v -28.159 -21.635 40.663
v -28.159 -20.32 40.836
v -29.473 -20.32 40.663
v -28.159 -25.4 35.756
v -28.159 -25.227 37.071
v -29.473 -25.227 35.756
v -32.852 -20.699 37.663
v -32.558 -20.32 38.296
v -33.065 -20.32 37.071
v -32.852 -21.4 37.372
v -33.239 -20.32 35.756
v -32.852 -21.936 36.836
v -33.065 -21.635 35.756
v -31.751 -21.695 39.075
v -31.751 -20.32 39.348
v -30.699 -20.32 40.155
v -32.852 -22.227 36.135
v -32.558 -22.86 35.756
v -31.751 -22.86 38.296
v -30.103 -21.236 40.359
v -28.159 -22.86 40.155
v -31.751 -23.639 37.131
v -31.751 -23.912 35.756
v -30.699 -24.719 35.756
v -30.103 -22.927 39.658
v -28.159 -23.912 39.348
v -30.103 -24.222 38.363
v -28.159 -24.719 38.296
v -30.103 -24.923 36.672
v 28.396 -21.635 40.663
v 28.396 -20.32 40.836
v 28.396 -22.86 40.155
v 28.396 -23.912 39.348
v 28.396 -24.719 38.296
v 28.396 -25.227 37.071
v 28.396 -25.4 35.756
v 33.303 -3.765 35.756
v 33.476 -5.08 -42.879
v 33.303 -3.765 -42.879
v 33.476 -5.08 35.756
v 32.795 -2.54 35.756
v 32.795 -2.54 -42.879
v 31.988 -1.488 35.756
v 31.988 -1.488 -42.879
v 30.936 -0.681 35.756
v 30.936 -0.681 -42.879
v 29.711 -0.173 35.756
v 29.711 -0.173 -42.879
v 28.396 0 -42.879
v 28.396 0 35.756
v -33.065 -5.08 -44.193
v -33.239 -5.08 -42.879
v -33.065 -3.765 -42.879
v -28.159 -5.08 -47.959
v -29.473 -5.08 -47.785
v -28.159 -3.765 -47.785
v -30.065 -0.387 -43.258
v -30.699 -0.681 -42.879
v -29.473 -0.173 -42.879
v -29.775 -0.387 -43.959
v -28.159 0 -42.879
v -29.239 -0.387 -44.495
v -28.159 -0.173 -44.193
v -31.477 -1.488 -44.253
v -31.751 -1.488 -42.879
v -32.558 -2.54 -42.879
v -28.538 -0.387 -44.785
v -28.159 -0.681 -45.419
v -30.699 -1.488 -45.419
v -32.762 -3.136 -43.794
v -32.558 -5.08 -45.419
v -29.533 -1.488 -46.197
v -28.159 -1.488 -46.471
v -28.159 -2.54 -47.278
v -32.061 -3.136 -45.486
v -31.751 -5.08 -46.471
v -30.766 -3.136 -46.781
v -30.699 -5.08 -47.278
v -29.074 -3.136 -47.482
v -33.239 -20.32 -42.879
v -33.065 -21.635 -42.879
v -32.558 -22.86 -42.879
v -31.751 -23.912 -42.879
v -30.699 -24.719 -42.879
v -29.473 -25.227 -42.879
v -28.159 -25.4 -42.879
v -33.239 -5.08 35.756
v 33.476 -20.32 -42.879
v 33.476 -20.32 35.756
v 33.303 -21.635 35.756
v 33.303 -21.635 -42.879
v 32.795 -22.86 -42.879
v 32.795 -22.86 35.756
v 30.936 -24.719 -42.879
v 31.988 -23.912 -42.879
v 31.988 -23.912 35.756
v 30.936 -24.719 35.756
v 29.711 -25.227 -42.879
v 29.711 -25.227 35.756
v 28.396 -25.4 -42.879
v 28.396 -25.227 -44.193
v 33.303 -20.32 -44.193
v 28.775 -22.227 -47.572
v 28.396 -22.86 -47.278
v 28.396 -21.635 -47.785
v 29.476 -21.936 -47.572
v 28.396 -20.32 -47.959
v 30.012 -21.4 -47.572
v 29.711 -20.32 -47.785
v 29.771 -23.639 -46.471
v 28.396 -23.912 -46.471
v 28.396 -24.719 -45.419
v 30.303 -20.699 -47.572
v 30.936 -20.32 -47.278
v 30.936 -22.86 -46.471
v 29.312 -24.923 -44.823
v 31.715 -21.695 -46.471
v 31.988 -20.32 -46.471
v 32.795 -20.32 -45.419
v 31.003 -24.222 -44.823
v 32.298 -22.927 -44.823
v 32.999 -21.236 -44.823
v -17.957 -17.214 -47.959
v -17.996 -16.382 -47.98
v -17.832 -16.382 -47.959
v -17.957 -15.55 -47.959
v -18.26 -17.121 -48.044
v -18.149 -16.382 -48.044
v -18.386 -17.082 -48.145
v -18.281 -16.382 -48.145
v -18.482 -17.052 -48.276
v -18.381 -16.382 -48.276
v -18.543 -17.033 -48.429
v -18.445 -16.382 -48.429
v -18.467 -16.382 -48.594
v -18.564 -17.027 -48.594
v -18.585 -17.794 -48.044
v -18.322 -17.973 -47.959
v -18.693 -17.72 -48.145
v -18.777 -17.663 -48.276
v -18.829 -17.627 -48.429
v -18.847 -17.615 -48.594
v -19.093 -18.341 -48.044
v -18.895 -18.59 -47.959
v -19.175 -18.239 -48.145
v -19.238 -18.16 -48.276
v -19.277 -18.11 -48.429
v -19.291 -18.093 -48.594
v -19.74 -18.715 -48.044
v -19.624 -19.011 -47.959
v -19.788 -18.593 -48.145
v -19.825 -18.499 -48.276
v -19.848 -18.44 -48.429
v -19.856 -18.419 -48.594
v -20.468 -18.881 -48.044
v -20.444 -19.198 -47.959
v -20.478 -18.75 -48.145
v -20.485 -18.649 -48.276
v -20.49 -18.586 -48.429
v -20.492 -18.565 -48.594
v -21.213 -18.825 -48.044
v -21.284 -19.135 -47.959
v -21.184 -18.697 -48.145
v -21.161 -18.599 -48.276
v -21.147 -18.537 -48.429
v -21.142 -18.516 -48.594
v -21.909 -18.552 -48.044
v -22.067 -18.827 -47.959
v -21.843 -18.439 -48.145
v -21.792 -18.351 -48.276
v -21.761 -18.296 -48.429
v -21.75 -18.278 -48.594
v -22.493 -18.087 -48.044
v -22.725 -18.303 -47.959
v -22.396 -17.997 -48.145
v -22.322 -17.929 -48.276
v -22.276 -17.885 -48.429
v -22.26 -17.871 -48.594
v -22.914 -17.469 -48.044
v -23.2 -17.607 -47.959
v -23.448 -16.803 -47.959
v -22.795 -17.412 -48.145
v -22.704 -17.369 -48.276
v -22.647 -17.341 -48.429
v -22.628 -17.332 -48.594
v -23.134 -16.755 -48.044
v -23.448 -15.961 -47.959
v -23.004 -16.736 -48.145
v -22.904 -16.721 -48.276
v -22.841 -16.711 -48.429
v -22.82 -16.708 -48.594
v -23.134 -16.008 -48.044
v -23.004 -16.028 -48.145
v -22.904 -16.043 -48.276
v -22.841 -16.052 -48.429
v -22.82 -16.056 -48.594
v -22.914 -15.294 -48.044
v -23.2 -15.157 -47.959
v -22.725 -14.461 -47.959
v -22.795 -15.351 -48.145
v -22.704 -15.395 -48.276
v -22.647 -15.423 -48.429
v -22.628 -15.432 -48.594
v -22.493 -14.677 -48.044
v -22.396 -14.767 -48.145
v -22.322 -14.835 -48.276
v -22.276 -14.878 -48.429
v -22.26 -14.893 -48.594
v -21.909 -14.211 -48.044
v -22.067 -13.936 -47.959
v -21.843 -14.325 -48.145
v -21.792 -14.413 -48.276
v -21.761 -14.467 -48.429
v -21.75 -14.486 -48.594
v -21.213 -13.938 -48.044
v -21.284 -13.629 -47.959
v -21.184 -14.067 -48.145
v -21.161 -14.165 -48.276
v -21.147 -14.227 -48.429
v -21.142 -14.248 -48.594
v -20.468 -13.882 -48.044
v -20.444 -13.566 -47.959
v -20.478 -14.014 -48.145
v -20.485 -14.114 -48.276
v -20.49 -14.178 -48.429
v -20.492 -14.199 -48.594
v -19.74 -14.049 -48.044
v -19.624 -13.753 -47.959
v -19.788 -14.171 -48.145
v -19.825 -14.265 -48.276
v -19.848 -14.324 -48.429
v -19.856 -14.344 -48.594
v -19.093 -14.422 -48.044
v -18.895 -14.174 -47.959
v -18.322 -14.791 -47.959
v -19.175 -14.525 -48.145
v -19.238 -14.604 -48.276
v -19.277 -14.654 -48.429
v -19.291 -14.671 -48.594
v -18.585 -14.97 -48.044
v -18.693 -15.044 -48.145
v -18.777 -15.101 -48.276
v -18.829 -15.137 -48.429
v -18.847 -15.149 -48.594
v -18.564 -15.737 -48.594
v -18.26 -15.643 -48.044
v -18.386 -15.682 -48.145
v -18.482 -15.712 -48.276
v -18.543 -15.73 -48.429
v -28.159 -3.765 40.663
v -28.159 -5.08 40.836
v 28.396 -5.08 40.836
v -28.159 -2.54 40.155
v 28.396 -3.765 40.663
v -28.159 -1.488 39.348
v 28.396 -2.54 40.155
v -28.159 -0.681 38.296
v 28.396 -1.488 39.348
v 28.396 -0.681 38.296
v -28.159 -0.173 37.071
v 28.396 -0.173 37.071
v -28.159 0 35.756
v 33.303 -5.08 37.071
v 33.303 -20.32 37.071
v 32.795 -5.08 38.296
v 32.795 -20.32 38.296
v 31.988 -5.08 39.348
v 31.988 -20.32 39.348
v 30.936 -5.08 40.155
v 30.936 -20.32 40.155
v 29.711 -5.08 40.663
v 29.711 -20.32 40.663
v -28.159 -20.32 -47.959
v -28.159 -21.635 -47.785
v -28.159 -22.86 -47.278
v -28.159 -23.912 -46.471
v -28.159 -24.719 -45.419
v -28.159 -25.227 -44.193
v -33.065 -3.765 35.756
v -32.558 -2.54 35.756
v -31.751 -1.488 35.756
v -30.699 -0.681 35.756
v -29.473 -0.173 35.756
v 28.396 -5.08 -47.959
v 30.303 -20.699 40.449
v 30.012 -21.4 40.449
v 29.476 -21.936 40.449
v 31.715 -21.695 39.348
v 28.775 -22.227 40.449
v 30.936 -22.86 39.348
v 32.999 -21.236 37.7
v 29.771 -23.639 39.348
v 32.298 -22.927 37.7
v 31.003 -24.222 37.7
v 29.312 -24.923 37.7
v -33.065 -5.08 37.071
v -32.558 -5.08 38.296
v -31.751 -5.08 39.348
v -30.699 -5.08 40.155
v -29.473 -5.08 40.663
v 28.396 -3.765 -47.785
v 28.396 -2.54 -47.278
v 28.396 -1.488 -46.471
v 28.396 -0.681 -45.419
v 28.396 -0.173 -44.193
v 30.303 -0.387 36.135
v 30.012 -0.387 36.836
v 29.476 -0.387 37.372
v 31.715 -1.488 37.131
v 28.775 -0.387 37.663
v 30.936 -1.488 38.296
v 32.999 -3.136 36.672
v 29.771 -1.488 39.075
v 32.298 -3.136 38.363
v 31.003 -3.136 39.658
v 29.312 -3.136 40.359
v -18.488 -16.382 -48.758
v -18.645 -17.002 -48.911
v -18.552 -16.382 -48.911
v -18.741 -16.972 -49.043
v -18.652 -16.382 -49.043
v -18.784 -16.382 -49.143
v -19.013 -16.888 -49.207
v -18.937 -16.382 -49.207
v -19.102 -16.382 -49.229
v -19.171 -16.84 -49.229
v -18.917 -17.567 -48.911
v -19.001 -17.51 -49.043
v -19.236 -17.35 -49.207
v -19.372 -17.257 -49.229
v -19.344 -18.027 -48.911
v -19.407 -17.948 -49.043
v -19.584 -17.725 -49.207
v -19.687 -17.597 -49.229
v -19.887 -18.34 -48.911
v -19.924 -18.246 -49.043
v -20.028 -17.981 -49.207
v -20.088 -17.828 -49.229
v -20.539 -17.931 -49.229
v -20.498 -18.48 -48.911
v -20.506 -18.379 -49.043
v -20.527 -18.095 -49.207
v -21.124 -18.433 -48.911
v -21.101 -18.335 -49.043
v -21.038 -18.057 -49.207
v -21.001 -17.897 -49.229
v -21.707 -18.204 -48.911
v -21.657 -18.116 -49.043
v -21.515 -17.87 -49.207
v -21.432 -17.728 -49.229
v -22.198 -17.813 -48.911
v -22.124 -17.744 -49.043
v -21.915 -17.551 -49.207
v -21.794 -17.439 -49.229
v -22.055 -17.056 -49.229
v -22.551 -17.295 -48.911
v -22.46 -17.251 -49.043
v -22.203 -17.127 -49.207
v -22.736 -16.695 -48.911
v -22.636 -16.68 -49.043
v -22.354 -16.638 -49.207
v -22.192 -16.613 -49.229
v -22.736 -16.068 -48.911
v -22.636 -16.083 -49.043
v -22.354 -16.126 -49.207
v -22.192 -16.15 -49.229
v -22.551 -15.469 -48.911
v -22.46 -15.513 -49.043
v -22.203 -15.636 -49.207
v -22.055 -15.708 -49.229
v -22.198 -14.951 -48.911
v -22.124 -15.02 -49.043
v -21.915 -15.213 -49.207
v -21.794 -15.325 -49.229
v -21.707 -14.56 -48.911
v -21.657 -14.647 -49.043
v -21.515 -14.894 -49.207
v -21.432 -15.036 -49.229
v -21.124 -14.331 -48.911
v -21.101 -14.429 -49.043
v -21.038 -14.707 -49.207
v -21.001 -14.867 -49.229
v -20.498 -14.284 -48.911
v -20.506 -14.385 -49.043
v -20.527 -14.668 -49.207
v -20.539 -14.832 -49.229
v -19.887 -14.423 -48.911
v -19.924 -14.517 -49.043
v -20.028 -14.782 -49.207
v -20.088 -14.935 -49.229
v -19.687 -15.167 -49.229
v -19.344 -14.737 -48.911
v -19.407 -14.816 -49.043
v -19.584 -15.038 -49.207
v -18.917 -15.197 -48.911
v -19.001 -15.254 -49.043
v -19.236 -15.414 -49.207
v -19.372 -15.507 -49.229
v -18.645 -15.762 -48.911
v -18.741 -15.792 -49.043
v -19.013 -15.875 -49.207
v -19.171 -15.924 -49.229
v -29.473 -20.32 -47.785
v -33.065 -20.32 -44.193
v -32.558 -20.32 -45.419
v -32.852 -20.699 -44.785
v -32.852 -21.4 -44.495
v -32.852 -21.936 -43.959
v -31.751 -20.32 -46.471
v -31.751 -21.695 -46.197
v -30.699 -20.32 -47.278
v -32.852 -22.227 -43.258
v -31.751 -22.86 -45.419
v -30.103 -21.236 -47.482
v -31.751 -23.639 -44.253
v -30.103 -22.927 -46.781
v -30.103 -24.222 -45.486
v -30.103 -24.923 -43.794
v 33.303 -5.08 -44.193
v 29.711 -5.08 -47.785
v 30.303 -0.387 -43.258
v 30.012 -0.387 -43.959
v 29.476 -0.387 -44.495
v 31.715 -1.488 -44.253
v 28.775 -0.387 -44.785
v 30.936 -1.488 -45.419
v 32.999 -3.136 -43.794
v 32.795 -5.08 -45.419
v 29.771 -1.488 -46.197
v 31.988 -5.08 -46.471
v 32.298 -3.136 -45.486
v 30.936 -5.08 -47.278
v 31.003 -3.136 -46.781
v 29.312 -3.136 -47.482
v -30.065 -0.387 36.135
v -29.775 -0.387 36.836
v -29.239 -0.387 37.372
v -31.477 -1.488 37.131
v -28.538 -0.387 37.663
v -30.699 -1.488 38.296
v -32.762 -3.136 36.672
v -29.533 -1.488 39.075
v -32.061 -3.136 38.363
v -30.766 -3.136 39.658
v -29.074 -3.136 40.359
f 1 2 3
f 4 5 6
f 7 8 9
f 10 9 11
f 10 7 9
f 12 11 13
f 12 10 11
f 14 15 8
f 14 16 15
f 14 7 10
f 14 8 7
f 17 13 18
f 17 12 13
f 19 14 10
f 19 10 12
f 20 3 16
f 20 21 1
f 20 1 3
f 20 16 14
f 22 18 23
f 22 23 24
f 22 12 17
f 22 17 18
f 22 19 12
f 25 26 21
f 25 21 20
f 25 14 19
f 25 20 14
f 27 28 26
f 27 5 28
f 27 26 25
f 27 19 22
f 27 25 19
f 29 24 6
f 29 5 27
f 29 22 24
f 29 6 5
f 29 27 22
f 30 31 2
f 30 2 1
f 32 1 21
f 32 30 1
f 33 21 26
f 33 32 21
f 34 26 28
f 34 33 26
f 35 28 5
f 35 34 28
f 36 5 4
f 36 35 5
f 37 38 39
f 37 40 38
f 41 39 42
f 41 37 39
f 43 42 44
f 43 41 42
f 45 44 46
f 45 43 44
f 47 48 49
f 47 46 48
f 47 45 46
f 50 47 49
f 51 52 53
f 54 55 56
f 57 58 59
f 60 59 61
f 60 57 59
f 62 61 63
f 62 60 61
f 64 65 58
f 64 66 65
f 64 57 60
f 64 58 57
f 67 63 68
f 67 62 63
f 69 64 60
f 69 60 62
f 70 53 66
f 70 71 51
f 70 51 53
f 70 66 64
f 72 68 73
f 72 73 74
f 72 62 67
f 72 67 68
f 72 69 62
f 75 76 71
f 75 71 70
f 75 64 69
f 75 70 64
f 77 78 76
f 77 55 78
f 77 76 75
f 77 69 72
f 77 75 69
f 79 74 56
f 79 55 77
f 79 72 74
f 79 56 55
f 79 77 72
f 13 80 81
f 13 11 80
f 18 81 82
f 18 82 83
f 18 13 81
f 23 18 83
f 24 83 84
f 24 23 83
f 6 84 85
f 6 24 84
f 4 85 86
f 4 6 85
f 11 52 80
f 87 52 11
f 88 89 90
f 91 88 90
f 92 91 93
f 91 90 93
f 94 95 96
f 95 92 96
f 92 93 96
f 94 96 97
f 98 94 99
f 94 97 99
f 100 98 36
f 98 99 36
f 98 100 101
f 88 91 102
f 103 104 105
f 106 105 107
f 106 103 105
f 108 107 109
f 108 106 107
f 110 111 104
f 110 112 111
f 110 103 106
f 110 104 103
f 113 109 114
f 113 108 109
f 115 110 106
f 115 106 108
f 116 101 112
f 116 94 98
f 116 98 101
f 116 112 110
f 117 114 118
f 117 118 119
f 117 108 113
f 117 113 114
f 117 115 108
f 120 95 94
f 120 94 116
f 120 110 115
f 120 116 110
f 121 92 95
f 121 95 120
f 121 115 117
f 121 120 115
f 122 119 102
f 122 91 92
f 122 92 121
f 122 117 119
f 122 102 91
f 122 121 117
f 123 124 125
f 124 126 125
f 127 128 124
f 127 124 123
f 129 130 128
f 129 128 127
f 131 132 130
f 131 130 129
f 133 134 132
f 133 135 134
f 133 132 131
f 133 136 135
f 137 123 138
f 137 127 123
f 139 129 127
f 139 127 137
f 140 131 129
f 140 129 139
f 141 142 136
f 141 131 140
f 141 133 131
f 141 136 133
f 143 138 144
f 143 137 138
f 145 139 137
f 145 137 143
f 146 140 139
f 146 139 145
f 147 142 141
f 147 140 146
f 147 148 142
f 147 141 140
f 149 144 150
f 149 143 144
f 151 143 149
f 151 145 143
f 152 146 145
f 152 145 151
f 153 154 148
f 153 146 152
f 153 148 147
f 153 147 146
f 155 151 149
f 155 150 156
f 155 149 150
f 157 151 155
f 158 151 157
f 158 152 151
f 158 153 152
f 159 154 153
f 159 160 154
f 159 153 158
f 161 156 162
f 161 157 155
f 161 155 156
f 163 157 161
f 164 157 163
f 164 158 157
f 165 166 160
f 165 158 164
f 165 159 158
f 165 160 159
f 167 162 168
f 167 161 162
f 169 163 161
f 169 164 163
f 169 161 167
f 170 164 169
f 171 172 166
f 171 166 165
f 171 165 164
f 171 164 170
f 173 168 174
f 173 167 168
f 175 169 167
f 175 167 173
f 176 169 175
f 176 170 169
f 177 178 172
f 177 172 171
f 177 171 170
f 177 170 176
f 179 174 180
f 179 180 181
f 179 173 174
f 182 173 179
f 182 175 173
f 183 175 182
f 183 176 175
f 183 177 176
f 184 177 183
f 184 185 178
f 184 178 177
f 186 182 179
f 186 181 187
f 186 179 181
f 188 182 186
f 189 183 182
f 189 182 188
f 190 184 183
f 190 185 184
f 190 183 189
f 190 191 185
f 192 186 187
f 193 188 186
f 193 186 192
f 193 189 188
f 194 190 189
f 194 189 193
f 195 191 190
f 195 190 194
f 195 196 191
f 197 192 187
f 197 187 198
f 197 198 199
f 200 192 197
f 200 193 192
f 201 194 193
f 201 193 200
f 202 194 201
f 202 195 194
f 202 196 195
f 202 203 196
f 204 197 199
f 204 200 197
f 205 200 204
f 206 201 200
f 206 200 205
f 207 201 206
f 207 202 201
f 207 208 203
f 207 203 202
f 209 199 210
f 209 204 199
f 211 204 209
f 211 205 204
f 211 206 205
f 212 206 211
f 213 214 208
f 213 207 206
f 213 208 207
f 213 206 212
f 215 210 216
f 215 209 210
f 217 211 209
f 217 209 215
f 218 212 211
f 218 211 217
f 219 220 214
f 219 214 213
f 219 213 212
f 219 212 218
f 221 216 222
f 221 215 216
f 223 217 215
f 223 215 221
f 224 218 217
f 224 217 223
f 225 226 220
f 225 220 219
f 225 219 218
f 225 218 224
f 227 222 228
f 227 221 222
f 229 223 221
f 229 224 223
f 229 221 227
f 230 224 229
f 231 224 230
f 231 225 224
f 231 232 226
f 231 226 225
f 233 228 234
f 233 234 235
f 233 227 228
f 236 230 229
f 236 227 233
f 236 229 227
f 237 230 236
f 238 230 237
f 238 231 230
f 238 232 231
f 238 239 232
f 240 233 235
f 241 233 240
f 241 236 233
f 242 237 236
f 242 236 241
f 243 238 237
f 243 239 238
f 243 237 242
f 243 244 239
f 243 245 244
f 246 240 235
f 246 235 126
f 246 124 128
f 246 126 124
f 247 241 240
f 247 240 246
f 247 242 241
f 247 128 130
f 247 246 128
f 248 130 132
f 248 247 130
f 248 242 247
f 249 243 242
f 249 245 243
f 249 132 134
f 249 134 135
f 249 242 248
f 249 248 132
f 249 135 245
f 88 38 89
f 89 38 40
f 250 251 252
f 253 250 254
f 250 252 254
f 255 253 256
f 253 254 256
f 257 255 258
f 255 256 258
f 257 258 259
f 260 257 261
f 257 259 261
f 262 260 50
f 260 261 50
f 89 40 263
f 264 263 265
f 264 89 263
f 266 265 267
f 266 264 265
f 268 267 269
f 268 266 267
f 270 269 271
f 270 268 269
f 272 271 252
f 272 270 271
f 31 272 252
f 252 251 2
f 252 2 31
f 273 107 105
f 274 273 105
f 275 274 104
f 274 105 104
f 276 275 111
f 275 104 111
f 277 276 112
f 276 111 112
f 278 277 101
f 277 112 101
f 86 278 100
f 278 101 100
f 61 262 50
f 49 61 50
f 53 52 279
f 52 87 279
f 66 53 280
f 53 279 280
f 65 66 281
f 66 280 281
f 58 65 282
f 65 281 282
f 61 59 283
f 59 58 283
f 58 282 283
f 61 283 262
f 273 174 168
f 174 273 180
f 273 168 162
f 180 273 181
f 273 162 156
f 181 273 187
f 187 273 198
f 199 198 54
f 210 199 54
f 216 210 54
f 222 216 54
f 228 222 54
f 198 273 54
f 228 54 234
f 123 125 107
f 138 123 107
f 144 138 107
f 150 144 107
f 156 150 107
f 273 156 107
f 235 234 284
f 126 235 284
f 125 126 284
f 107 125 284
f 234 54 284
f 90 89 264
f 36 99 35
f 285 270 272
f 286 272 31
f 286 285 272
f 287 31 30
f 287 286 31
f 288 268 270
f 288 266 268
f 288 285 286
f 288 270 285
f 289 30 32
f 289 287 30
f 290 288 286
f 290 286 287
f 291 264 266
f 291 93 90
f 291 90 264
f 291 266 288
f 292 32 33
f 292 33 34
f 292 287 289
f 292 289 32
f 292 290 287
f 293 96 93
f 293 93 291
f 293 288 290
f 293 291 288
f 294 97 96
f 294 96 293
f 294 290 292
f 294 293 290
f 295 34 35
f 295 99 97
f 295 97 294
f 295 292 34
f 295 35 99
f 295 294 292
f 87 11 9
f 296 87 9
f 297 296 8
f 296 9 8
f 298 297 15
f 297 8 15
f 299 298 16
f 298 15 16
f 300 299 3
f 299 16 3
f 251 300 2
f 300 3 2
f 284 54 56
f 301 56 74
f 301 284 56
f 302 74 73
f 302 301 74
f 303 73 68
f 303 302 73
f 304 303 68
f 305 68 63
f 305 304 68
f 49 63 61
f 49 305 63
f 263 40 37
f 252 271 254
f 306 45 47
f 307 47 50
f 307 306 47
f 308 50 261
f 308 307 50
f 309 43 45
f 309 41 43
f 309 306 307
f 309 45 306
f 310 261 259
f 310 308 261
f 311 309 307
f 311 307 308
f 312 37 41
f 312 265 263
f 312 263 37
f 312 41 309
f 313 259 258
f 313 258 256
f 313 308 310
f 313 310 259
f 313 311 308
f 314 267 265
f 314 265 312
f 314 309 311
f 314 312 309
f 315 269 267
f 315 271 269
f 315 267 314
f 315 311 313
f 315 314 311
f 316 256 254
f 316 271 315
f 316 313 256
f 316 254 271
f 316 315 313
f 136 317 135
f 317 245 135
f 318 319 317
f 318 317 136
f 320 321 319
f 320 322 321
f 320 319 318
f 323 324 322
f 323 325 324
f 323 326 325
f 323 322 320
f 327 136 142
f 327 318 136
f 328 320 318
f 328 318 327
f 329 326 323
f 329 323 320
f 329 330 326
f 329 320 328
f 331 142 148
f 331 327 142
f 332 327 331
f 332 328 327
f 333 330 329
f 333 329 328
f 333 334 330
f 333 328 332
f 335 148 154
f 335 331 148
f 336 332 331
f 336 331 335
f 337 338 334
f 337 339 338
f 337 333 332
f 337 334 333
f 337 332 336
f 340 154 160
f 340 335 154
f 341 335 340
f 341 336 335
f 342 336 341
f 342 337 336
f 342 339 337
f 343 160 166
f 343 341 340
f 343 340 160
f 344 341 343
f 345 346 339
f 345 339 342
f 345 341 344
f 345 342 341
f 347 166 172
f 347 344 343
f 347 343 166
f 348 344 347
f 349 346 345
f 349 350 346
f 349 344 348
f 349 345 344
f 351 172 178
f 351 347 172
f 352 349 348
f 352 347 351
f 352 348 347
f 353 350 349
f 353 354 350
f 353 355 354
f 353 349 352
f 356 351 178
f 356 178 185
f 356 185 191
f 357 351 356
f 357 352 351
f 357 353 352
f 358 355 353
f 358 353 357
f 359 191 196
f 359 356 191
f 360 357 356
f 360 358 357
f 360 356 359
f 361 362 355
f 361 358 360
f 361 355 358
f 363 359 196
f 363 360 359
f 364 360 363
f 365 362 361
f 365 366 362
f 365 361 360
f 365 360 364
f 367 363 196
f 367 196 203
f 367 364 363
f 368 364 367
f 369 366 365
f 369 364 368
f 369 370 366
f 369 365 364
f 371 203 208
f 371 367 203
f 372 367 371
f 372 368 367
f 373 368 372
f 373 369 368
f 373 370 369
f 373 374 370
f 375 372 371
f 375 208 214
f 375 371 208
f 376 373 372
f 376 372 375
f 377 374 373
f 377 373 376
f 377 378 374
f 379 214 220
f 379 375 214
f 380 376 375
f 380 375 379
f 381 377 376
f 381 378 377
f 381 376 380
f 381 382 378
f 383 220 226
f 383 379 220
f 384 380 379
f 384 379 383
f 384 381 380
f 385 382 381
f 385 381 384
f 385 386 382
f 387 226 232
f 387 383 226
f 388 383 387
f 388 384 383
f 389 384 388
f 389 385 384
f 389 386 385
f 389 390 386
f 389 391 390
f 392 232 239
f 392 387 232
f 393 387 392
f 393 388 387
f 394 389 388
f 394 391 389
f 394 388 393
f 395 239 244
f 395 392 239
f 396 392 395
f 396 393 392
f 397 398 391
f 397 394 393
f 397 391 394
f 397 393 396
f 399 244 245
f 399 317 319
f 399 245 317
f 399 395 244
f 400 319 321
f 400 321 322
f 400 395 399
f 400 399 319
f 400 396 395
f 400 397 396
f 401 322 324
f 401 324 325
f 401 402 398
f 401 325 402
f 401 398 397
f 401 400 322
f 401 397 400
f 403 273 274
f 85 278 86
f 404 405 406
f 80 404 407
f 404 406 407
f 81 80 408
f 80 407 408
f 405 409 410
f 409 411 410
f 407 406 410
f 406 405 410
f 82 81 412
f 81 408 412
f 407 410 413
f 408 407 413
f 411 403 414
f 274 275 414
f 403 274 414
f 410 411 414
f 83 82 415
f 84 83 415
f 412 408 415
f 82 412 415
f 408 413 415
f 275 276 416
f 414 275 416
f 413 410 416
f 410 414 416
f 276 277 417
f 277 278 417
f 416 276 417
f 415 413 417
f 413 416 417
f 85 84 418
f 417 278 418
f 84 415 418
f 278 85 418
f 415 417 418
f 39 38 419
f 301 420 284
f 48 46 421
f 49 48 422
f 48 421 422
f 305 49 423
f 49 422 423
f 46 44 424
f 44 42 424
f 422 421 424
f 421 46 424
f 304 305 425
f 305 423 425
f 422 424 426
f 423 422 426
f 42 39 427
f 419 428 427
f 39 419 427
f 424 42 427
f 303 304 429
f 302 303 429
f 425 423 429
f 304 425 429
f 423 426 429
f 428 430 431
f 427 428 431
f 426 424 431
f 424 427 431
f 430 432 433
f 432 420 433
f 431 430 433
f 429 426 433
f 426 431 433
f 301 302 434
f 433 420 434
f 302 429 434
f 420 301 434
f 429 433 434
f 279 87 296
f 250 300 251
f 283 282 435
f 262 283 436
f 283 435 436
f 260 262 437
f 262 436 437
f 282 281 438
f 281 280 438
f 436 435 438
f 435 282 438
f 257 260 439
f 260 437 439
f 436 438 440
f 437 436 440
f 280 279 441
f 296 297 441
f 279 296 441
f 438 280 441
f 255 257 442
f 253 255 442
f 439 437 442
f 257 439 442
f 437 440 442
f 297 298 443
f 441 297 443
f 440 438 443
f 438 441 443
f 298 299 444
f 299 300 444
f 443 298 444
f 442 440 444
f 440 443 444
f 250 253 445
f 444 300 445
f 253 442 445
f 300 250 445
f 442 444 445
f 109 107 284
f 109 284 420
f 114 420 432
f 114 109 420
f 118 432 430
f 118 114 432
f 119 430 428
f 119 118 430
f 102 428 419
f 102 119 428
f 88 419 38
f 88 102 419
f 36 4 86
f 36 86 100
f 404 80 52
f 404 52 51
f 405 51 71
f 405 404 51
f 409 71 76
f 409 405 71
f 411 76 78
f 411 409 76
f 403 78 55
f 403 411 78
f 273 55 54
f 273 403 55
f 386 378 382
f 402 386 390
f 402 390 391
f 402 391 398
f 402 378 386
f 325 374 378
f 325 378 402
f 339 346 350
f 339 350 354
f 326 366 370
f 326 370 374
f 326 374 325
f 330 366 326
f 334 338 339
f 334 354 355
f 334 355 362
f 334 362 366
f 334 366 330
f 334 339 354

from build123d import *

# Parameters (mm, degrees)
F0_W     = 66.714566201
F0_H     = 88.7944847345
F1_DEPTH = 25.4
F2_R     = 5.08
F3_R     = 2.1888893323
F4_DEPTH = 1.27
F5_R     = 0.63499


# Not quite as in the source:
# - a fillet or chamfer is up to 0.001 mm smaller than in the source, because OpenCascade refuses the exact size


with BuildPart() as f1:
    # F0 (on Front) → F1 (new body)
    with BuildSketch(Plane.XZ):
        with Locations((0.118708238, -3.5612769425)):
            Rectangle(F0_W, F0_H)
    extrude(amount=F1_DEPTH)

    # F2
    f2_edges = [f1.edges().sort_by_distance(p)[0] for p in [
        (33.475991, -25.4, -3.561277),
        (0.118708, -25.4, -47.958519),
        (33.475991, -12.7, -47.958519),
        (33.475991, -12.7, 40.835965),
        (33.475991, 0, -3.561277),
        (0.118708, -25.4, 40.835965),
        (-33.238575, -12.7, 40.835965),
        (-33.238575, -12.7, -47.958519),
        (-33.238575, 0, -3.561277),
        (-33.238575, -25.4, -3.561277),
        (0.118708, 0, 40.835965),
        (0.118708, 0, -47.958519),
    ]]
    fillet(f2_edges, radius=F2_R)

    # F3 (on face) → F4 (join)
    with BuildSketch(Plane(origin=(0, 0, -47.9585193098), x_dir=(1, 0, 0), z_dir=(0, 0, -1))):
        with Locations((-20.655401051, 16.3818709552)):
            Circle(F3_R)
    extrude(amount=F4_DEPTH)

    # F5 (radius 0.635 in the source; OpenCascade refuses exactly that, so slightly less here)
    f5_edges = [f1.edges().sort_by_distance(p)[0] for p in [
        (-22.84429, -16.381871, -49.228519),
        (-22.84429, -16.381871, -47.958519),
        (-18.466512, -16.381871, -48.593519),
    ]]
    fillet(f5_edges, radius=F5_R)


solid = f1.part
